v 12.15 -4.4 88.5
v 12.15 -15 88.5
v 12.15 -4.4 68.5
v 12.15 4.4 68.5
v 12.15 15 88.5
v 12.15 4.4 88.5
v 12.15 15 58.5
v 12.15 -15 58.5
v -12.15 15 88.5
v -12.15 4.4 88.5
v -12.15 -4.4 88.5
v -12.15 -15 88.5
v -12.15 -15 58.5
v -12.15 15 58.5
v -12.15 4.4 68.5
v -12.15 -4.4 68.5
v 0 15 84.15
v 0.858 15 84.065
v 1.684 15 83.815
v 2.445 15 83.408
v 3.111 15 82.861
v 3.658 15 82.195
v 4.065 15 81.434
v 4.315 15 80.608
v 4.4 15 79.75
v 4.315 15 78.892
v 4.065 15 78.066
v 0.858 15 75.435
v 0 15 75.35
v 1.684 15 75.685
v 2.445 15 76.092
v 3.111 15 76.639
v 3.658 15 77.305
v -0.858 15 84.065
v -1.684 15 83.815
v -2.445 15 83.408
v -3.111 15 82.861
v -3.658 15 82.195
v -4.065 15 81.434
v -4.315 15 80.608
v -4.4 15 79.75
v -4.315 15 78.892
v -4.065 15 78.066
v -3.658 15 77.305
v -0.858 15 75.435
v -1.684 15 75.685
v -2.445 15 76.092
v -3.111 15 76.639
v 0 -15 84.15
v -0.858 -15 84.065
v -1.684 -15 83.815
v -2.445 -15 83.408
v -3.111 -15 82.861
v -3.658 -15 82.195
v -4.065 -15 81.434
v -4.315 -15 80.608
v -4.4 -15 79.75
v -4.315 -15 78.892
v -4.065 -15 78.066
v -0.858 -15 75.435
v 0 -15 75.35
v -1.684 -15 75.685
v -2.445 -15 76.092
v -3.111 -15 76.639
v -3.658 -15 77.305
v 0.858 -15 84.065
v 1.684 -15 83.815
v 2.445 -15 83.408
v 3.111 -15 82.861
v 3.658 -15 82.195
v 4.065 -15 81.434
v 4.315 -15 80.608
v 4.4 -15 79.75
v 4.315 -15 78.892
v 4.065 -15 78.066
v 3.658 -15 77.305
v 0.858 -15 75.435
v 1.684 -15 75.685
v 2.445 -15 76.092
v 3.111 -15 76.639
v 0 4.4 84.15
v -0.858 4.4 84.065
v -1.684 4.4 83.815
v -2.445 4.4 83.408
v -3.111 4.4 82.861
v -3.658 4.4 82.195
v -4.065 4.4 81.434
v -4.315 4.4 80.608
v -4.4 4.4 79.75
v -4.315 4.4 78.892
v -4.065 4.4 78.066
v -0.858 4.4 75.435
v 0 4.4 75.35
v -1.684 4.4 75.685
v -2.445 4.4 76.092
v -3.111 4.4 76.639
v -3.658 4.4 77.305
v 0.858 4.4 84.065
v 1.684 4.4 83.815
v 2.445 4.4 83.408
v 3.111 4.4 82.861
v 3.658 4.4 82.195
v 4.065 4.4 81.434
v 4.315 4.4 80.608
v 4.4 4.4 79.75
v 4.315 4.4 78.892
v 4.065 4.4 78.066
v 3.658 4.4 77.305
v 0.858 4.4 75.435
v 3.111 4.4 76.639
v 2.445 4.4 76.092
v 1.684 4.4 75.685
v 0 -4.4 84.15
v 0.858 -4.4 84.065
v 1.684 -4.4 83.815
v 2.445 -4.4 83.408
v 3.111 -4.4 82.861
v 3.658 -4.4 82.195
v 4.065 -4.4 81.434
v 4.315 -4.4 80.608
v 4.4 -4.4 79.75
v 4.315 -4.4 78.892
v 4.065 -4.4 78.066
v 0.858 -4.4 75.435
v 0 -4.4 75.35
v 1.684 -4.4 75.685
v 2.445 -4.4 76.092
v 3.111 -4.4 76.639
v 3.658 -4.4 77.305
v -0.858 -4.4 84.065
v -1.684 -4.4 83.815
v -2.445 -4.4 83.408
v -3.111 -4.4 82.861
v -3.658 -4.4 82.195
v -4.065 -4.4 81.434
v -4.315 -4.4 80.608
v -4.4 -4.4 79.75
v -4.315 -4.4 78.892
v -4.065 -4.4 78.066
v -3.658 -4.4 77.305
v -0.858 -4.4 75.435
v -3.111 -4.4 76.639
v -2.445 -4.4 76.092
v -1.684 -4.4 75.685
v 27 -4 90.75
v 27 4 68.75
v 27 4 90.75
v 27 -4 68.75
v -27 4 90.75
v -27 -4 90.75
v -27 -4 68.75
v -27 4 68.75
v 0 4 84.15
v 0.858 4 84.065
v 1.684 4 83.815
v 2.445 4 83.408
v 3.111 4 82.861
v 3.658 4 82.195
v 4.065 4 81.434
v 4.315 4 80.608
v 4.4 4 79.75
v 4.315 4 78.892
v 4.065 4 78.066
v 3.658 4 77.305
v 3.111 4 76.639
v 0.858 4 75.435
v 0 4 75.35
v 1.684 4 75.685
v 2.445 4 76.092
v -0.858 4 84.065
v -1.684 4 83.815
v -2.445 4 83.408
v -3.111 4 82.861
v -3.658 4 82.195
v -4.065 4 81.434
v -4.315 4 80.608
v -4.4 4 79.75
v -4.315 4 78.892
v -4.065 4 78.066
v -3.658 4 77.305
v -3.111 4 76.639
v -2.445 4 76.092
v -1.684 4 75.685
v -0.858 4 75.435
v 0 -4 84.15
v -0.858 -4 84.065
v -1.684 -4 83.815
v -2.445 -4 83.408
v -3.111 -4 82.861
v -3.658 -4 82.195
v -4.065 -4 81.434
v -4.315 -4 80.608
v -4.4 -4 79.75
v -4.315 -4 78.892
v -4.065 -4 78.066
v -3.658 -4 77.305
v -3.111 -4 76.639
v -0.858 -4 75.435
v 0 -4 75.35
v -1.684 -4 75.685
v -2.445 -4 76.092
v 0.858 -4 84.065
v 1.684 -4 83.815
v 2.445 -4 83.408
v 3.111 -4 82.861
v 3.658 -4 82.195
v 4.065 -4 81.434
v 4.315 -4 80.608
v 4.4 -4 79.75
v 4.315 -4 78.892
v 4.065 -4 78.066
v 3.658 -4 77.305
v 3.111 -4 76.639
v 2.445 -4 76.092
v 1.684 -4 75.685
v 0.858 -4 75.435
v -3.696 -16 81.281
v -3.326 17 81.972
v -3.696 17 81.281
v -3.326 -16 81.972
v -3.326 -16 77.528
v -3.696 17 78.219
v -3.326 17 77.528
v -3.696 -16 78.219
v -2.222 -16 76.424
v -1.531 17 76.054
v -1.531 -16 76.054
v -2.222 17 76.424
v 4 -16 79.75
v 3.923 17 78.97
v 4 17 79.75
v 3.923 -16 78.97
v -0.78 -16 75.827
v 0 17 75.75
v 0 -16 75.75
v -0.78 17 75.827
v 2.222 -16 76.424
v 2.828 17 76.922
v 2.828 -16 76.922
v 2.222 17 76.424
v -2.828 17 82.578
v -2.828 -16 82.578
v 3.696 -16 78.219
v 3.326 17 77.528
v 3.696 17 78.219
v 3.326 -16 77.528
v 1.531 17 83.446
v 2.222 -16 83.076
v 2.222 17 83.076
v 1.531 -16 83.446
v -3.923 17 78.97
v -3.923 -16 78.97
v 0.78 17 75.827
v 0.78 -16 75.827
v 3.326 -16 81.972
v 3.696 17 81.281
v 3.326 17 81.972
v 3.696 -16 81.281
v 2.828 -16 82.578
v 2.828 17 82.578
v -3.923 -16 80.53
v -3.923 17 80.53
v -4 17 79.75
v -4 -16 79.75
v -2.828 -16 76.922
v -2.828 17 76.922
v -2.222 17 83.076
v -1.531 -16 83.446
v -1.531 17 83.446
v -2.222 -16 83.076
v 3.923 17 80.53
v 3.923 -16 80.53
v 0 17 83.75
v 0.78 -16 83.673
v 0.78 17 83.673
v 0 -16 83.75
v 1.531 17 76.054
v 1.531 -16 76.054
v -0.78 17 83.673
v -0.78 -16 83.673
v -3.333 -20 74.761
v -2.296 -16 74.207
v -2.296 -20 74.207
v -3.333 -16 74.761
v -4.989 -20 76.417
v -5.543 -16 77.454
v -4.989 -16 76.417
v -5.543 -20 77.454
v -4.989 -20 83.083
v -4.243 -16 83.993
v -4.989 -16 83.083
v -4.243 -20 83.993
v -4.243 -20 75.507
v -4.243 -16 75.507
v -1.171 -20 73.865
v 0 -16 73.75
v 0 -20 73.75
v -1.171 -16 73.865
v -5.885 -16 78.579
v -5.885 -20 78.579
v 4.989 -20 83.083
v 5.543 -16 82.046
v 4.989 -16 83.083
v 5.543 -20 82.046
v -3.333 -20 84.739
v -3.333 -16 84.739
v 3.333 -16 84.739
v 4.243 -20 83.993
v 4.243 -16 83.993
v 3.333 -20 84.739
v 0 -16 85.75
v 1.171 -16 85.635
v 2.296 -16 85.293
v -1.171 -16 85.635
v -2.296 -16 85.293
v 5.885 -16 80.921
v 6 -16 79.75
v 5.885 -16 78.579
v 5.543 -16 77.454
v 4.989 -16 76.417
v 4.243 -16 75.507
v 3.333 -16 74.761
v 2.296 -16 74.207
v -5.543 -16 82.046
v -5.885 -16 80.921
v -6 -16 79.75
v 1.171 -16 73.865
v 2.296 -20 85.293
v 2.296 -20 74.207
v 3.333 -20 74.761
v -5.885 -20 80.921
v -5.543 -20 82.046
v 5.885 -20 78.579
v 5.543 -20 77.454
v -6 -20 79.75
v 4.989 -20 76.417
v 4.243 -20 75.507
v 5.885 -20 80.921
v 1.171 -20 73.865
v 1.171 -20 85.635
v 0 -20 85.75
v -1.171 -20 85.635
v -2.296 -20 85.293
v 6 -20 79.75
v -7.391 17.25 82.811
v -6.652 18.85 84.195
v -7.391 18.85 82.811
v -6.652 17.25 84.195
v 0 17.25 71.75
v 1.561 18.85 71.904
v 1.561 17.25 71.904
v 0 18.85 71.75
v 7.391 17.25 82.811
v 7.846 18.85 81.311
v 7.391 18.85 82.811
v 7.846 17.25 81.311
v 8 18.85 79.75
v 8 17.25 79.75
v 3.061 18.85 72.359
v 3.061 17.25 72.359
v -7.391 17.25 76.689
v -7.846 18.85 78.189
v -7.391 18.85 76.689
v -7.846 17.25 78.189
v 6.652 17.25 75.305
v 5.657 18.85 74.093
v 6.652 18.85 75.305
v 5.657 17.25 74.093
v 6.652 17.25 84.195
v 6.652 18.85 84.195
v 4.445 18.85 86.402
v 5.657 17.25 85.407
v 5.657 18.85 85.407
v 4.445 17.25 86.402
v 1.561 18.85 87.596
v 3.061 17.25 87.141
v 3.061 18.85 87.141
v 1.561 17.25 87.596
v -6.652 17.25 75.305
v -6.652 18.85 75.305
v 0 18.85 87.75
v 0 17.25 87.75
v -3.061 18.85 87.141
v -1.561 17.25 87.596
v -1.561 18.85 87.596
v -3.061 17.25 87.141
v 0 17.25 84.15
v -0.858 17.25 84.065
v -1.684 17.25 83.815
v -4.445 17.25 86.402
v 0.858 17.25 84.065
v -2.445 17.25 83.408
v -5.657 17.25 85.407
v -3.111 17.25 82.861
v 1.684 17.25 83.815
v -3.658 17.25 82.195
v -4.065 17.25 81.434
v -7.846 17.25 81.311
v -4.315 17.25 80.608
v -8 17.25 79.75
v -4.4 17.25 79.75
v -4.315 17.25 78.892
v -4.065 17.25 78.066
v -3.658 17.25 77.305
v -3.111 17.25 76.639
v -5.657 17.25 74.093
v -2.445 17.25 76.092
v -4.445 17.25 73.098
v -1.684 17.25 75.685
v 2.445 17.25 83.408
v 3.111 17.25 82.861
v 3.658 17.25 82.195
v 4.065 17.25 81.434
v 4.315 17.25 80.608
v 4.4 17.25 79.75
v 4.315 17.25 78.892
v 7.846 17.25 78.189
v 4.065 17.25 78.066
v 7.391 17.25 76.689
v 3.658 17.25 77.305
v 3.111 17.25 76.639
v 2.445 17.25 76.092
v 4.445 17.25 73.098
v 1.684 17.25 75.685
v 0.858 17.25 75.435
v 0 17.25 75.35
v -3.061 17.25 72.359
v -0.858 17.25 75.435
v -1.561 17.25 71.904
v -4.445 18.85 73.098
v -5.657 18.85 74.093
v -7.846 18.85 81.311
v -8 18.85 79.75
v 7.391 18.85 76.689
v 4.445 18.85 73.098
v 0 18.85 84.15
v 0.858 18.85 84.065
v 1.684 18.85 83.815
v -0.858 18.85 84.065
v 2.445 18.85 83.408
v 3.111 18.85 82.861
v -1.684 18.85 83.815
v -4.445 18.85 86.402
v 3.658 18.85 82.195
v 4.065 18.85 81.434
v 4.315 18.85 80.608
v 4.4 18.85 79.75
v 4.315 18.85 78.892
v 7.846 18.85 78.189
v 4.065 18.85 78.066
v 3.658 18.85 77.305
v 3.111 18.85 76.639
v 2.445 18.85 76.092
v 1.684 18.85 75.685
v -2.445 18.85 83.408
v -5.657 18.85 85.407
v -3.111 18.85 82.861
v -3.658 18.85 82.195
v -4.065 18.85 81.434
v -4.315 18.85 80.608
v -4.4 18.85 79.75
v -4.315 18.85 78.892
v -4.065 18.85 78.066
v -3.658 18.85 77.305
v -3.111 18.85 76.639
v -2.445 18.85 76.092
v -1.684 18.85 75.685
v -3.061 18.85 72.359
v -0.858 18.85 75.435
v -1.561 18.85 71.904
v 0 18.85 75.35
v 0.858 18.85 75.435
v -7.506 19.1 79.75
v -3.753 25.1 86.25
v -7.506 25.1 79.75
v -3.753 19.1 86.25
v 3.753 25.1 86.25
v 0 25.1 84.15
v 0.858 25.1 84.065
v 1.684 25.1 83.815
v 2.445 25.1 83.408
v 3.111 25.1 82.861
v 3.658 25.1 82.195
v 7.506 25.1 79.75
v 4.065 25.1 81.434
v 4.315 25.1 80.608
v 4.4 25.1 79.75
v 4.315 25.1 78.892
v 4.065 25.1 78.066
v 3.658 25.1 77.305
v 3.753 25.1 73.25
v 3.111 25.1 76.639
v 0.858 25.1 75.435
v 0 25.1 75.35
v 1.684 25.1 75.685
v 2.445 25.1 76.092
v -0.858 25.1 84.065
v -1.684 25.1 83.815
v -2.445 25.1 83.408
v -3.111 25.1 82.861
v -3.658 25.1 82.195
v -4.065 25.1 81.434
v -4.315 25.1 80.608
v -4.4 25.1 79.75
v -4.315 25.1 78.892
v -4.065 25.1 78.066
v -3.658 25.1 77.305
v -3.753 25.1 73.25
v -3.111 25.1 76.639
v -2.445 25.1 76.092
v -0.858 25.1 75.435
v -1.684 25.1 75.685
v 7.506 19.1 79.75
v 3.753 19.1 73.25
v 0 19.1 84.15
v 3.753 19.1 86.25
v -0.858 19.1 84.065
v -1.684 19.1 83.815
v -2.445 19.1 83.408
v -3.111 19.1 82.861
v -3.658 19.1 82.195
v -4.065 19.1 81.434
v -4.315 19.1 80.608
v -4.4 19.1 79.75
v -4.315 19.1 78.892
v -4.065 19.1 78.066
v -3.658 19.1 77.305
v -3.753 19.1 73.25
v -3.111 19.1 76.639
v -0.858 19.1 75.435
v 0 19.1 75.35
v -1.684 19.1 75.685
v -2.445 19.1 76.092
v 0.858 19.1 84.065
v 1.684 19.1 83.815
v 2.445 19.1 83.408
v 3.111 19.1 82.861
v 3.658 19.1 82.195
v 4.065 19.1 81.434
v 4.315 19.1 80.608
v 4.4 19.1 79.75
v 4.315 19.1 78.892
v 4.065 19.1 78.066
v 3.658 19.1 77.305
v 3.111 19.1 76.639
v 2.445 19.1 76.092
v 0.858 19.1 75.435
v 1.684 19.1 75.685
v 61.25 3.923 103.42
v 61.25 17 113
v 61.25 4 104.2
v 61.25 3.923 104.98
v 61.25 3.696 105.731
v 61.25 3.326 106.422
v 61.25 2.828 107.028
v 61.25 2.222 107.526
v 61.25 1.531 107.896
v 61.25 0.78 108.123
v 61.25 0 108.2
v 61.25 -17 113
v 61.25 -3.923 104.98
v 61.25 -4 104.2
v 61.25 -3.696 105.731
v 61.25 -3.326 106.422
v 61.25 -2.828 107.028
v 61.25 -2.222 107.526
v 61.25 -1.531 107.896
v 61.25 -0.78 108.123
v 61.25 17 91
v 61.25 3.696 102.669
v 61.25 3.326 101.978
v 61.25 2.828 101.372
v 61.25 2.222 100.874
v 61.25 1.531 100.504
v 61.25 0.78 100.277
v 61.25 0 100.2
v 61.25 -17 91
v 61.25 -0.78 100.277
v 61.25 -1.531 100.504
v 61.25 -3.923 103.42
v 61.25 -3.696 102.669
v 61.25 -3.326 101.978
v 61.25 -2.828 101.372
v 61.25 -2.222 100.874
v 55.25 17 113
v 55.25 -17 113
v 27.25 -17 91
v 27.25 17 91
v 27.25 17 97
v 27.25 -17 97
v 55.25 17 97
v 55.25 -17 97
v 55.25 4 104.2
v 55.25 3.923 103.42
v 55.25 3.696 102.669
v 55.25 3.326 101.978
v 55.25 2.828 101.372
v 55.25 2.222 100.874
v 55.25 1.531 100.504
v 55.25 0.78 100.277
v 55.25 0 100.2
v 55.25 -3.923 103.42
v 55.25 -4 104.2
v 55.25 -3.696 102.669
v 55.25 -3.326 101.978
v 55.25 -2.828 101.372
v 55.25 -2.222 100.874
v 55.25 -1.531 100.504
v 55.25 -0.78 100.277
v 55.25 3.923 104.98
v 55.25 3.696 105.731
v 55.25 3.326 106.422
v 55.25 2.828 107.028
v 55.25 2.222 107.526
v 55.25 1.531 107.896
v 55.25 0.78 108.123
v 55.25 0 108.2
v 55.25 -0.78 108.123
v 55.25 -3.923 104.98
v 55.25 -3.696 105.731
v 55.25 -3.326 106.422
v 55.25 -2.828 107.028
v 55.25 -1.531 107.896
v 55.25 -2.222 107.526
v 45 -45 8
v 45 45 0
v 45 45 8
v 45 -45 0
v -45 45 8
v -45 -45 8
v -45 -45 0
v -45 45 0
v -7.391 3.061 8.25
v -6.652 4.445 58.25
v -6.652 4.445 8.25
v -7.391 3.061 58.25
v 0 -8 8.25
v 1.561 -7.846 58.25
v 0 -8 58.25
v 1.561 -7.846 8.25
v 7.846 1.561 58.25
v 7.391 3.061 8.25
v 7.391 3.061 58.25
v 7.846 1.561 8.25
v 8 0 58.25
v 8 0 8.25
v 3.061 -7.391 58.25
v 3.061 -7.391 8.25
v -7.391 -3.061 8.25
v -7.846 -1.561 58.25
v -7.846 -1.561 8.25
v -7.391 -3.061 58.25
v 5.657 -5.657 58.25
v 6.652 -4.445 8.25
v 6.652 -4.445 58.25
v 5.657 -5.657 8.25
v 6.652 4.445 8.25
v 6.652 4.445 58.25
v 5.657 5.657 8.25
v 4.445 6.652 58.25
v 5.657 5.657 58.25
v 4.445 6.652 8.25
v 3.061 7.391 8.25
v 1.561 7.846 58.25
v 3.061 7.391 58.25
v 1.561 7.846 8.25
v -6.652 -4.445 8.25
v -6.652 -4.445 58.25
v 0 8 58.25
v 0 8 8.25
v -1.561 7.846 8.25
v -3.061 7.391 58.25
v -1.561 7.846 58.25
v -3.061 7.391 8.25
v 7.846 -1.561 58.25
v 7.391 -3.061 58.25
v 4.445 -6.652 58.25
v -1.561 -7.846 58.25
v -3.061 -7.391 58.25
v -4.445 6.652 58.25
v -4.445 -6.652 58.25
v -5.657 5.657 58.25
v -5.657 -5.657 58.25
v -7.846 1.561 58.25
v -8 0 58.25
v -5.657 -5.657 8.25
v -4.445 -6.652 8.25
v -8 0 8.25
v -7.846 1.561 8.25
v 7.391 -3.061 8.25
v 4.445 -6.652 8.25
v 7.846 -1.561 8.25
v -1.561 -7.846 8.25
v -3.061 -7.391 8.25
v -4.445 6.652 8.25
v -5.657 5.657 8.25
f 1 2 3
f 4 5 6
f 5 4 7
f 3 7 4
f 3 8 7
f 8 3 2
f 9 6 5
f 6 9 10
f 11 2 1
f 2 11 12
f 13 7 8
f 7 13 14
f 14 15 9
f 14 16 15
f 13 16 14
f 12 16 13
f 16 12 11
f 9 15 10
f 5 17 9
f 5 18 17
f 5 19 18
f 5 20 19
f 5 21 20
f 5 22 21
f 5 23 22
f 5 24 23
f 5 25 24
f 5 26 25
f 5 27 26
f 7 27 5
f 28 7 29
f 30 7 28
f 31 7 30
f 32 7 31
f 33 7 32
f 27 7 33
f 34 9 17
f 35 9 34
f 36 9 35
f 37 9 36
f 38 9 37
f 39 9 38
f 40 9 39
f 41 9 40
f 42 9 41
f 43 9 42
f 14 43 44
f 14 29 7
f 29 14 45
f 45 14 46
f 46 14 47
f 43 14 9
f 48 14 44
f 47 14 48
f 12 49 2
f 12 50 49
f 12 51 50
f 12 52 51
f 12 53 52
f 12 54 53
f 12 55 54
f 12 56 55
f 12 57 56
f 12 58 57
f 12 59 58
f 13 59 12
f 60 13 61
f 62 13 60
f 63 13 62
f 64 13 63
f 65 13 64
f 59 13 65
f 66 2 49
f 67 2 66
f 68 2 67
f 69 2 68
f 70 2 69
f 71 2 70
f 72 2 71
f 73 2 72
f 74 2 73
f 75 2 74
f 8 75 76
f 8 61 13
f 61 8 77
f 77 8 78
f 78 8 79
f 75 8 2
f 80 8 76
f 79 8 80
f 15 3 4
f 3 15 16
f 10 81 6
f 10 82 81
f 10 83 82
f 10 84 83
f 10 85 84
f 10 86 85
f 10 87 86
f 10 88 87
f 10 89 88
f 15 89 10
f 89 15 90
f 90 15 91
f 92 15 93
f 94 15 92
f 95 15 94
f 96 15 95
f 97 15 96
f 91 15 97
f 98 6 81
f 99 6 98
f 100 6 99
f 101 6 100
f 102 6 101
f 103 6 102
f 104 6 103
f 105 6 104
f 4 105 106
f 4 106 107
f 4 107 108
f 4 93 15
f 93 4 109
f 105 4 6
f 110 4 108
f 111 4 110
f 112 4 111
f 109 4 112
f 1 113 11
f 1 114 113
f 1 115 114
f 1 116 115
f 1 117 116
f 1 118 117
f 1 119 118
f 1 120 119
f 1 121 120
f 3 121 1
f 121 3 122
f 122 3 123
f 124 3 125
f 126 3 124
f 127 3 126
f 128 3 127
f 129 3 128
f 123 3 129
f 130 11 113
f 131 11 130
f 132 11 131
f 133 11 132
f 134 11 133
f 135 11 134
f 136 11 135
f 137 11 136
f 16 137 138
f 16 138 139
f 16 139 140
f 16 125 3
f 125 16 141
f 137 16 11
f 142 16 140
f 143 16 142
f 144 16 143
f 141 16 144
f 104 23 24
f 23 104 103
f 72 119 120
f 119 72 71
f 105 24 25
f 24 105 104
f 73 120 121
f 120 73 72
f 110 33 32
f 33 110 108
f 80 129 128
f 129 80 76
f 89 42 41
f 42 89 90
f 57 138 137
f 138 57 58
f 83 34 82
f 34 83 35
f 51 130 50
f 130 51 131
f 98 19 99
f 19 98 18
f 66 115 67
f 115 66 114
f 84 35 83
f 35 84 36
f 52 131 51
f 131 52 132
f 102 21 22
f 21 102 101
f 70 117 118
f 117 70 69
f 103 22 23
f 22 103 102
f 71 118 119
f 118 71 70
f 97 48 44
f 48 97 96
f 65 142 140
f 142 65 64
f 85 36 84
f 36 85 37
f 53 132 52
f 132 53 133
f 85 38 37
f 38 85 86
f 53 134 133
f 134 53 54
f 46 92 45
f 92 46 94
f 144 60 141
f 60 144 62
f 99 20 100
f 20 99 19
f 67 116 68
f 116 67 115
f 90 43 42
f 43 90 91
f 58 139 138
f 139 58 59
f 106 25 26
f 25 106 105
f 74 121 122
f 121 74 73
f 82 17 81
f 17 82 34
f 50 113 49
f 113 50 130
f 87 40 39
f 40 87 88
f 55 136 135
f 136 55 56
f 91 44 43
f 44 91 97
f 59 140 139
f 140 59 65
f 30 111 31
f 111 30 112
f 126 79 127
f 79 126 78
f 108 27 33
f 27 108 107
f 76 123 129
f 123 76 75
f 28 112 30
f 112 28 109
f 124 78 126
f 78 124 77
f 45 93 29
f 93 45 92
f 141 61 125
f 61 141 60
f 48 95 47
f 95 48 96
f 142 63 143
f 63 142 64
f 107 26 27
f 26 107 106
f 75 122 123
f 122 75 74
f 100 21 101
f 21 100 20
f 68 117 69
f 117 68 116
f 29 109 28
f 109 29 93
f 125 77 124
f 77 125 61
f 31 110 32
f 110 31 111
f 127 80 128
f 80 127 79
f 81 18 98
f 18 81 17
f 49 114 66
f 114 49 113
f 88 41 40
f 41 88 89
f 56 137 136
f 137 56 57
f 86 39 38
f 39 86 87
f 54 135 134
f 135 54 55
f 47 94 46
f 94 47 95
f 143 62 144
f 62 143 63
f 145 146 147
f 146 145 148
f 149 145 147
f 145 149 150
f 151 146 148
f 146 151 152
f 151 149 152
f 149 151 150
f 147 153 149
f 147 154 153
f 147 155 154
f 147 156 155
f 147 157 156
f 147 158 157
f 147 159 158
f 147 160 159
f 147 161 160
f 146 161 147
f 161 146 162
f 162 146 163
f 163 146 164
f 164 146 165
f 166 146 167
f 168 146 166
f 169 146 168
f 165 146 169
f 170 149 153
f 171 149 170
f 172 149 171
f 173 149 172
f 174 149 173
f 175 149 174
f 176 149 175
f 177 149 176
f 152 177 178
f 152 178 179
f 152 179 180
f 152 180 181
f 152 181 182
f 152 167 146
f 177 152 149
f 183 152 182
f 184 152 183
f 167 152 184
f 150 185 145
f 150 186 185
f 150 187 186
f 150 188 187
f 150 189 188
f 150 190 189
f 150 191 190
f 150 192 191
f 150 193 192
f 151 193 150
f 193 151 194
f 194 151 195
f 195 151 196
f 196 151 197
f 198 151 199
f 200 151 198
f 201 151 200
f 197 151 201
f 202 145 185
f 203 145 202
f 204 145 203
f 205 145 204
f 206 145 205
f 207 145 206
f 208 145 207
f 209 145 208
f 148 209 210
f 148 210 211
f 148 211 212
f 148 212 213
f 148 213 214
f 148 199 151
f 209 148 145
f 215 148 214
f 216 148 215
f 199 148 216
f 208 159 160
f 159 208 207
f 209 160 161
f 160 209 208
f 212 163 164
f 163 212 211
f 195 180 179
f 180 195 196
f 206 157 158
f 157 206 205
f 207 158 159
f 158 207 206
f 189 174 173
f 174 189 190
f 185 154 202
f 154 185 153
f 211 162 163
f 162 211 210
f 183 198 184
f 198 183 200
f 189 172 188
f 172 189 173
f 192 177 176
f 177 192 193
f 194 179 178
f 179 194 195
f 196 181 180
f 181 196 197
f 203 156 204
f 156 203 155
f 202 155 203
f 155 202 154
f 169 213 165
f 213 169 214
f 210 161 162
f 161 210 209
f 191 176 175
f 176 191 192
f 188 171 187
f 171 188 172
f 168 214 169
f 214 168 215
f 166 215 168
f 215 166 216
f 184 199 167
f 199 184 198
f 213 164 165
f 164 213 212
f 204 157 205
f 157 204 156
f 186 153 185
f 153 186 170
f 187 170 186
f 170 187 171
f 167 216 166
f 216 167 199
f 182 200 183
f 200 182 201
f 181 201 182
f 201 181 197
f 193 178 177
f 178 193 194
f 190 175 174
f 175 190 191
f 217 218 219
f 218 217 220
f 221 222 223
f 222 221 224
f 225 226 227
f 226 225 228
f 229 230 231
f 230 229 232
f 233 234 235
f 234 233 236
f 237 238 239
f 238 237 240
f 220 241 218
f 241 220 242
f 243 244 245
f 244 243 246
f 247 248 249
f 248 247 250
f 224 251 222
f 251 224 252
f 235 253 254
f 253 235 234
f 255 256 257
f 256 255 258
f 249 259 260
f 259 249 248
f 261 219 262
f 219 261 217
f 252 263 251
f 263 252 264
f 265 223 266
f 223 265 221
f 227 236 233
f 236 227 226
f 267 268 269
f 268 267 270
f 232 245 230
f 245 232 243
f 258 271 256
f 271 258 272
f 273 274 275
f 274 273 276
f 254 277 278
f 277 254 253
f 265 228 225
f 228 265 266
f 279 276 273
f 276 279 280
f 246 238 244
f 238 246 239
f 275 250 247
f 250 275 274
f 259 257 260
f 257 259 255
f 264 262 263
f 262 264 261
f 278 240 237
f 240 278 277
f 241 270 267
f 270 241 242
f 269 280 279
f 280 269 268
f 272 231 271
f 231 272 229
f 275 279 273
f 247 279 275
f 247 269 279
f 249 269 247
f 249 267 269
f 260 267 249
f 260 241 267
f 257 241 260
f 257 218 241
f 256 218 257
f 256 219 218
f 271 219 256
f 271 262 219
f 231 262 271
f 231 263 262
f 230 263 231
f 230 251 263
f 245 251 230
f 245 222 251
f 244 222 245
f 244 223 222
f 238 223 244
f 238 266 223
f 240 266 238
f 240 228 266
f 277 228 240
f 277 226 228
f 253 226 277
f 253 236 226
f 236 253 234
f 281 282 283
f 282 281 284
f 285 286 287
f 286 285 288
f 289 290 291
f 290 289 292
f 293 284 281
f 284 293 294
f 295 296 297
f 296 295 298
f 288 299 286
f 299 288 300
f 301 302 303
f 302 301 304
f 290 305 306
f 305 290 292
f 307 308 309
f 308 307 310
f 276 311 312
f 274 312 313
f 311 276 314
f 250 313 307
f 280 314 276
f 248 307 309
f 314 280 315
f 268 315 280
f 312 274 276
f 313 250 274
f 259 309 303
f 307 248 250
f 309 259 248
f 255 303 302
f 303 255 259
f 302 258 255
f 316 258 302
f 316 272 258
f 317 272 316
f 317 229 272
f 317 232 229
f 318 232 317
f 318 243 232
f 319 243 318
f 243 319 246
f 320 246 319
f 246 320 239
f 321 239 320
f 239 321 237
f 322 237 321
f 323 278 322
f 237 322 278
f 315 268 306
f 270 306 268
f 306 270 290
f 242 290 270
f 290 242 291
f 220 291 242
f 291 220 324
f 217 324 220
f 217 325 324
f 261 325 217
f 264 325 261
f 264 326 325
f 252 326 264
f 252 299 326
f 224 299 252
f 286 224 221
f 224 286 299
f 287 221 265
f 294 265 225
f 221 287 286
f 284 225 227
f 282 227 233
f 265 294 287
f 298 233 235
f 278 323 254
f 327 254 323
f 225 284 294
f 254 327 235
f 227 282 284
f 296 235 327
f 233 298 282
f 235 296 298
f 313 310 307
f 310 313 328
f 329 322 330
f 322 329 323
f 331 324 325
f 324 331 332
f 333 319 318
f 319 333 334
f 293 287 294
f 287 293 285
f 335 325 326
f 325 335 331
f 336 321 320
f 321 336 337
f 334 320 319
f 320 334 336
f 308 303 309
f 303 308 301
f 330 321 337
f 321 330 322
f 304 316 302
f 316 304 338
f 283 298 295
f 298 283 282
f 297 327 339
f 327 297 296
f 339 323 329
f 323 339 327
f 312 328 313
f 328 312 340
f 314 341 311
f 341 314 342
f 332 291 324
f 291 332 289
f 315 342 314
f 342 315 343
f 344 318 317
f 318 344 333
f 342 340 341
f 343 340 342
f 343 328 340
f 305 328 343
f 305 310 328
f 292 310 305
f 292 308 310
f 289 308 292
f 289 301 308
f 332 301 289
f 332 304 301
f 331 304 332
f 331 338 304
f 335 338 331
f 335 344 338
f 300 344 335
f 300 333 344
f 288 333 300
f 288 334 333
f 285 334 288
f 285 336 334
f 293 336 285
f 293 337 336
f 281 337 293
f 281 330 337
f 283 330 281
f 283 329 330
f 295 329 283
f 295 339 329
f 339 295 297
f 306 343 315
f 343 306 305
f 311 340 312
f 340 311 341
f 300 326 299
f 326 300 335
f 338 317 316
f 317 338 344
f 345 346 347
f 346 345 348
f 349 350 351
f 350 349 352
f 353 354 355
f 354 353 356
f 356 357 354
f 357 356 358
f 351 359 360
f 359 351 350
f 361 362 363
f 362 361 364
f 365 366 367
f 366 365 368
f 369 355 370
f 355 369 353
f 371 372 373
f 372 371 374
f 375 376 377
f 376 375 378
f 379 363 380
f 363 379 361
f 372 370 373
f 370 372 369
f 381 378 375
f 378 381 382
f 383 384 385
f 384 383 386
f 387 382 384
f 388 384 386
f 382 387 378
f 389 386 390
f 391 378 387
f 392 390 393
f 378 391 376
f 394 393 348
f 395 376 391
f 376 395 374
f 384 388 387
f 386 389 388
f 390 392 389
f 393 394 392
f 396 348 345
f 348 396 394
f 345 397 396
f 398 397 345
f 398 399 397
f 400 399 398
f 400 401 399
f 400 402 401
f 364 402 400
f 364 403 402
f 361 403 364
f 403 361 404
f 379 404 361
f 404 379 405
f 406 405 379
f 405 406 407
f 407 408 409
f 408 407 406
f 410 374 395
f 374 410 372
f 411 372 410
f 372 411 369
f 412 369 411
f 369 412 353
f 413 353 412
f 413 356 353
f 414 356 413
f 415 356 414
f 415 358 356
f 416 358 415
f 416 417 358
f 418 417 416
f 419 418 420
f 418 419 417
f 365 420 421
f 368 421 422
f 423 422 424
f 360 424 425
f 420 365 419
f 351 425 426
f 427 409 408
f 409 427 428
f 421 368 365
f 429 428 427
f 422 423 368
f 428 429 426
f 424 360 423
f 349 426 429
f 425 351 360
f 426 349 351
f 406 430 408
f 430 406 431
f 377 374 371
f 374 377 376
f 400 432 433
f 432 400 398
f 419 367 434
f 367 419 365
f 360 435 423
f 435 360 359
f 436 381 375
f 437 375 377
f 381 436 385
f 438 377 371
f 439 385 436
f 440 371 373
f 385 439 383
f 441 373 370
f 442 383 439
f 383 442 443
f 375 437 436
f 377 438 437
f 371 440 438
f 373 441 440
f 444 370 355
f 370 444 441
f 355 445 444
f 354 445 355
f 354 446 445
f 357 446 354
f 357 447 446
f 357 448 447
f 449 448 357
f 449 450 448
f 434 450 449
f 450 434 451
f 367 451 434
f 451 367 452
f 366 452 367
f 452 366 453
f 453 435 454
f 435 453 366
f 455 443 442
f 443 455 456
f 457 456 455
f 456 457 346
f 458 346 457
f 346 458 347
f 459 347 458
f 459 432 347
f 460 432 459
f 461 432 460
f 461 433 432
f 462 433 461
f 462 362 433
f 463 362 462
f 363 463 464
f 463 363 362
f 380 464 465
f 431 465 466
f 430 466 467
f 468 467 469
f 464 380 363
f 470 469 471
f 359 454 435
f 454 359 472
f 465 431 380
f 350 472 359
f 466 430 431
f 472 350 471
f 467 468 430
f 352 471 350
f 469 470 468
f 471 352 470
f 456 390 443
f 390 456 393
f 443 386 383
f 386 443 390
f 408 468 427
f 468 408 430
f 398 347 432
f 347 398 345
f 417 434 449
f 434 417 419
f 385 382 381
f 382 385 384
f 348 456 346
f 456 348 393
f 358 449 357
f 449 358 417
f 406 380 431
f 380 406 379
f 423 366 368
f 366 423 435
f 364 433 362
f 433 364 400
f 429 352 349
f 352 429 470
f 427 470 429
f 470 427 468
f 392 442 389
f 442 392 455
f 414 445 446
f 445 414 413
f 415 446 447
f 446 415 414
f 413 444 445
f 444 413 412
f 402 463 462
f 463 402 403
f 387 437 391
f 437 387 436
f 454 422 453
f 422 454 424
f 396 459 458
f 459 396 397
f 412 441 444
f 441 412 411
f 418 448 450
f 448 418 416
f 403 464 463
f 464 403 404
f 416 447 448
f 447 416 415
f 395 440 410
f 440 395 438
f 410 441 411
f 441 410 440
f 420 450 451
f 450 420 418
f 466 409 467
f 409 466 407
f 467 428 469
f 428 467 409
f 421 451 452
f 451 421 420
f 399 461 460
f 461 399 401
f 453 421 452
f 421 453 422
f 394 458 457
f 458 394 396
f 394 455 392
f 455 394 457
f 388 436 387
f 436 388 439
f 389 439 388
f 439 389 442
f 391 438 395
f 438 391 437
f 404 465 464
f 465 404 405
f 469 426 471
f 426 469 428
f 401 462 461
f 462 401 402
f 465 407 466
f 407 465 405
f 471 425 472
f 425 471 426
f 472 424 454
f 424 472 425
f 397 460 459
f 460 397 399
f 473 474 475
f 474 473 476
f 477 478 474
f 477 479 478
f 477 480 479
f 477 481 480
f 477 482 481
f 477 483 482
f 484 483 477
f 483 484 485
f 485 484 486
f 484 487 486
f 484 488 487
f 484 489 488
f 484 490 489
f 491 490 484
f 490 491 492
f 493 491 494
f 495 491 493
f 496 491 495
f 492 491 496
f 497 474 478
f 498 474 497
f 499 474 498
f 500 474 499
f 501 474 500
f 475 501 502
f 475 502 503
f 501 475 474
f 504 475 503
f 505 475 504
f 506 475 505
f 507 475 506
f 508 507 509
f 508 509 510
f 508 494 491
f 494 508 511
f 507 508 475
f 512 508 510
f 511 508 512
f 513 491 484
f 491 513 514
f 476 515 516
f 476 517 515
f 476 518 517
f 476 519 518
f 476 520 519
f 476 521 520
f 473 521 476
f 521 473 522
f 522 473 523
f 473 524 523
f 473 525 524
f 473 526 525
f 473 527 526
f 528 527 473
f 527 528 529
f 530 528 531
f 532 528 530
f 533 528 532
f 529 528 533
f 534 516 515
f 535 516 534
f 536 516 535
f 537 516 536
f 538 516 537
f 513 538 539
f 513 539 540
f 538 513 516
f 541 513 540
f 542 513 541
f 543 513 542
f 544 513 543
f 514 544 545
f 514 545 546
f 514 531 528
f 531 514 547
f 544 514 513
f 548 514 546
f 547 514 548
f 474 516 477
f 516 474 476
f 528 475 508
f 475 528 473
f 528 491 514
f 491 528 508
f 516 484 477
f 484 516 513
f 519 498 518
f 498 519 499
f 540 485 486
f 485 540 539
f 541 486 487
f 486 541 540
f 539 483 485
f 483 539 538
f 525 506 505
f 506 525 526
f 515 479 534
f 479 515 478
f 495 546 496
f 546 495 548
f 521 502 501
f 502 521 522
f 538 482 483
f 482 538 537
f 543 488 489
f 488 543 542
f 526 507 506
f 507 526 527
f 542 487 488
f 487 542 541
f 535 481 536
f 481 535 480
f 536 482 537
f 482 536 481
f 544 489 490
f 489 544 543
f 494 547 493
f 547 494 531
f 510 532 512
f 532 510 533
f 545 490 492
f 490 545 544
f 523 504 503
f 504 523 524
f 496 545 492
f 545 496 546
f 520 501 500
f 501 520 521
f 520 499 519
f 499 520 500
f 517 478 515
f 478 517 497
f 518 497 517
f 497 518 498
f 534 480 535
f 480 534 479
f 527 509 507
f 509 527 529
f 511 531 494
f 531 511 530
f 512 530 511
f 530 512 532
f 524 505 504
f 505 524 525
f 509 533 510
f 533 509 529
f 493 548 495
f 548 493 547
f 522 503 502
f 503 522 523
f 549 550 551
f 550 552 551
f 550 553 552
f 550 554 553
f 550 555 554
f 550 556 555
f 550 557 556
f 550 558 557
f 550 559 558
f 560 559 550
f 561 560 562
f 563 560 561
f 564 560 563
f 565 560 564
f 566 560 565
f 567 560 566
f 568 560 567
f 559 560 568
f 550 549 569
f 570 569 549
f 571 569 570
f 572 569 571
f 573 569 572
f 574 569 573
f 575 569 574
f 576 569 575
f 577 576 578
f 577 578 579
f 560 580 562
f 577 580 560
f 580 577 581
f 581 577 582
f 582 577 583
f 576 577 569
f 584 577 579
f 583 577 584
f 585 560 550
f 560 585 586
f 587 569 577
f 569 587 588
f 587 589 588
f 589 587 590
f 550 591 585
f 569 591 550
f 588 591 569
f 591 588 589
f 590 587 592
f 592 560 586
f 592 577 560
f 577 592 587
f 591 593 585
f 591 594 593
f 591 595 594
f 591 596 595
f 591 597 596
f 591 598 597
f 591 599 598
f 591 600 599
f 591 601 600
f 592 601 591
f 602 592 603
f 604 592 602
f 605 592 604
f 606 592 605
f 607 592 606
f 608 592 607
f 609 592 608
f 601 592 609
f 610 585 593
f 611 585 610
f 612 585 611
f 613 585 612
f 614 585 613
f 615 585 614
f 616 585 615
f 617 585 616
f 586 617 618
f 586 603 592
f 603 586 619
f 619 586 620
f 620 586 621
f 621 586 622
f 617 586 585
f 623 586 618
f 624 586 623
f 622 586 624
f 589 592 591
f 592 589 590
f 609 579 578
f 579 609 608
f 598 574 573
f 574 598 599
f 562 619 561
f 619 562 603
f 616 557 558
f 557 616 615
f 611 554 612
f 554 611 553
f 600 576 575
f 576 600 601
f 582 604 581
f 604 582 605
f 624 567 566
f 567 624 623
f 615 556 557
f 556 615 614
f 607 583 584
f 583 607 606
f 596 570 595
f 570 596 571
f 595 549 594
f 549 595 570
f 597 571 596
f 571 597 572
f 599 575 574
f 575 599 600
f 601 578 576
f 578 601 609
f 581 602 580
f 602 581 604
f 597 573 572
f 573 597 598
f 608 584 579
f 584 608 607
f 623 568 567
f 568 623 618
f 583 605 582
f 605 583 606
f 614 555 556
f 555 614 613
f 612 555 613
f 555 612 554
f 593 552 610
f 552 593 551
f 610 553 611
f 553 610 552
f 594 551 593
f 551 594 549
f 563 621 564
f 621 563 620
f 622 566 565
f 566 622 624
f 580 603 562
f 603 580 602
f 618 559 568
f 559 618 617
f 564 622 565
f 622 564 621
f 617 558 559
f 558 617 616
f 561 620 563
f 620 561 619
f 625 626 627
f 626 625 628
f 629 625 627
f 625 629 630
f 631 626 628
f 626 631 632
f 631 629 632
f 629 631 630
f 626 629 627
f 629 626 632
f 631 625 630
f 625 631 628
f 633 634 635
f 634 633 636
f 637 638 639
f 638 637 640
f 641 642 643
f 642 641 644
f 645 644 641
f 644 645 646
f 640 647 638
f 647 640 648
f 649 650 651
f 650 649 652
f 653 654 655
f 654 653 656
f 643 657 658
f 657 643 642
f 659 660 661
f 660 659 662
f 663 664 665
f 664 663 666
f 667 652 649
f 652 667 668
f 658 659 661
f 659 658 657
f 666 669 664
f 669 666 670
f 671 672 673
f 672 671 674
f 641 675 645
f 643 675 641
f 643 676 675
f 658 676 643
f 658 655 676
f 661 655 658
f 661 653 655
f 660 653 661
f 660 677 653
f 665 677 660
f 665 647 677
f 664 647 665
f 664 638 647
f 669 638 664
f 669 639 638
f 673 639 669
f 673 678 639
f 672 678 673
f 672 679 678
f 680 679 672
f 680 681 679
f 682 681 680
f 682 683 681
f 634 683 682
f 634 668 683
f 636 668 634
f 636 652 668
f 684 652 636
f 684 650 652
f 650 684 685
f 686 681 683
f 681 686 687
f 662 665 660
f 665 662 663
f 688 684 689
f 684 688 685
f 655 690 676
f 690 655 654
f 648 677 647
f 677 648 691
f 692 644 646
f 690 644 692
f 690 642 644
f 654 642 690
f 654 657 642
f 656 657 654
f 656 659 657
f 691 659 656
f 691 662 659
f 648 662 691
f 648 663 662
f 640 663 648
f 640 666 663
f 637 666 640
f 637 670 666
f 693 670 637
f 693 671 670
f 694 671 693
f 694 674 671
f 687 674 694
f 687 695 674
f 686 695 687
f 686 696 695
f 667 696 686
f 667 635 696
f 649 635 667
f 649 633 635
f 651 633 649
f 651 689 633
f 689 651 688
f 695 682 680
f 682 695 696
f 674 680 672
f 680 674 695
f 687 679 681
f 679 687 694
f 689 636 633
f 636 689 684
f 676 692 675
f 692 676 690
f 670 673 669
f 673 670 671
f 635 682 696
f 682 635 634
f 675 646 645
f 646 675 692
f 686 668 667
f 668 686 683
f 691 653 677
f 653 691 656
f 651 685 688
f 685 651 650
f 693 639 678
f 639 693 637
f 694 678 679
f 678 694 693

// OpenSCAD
$fn = 32;

// ------------------------------------------------------------------------
// Lamp arm: column d16 x 50 mm, arm 54 mm
// Every part is its own module, assembly() places every instance.
// ------------------------------------------------------------------------

// --- part 1 ---
module lamp_base() {
  difference() {
    translate([-45, -45, 0]) cube([90, 90, 8]);
  }
}

// --- part 2 ---
module lamp_column() {
  cylinder(h = 50, d = 16);
}

// --- part 3 ---
module head_fork() {
  difference() {
    translate([-12.15, -15, 0]) cube([24.3, 30, 30]);
    translate([-13.15, -4.4, 10]) cube([26.3, 8.8, 21]);
    translate([0, 0, 21.25]) rotate([90, 0, 0]) cylinder(h = 32, d = 8.8, center = true);
  }
}

// --- part 4 ---
module lamp_arm() {
  difference() {
    translate([-27, -4, 0]) cube([54, 8, 22]);
    translate([0, 0, 11]) rotate([90, 0, 0]) cylinder(h = 10, d = 8.8, center = true);
  }
}

// --- part 5 ---
module arm_pin() {
  rotate([0, 90, 0]) cylinder(h = 34, d = 8, center = true);
  translate([-20, 0, 0]) rotate([0, 90, 0]) cylinder(h = 4, d = 12);
}

// --- part 6 ---
module arm_washer() {
  difference() {
      translate([0, 0, 0]) cylinder(h = 1.6, d = 16);
      translate([0, 0, -1]) cylinder(h = 3.6, d = 8.8);
    }
}

// --- part 7 ---
module arm_nut() {
  difference() {
    linear_extrude(height = 6) polygon(points = [[7.506, 0], [3.753, 6.5], [-3.753, 6.5], [-7.506, 0], [-3.753, -6.5], [3.753, -6.5]]);
    translate([0, 0, -1]) cylinder(h = 8, d = 8.8);
  }
}

// --- part 8 ---
module shade_bracket() {
  difference() {
    translate([-17, -17, 0]) cube([34, 34, 22]);
    translate([-18, -18, 6]) cube([29, 36, 17]);
    translate([14, 0, 13.2]) rotate([0, 90, 0]) cylinder(h = 8, d = 8, center = true);
  }
}

// --- assembly ---
module assembly() {
  color([0.80, 0.24, 0.20]) translate([0, 0, 0]) rotate([0, 0, 0]) lamp_base();
  color([0.20, 0.45, 0.75]) translate([0, 0, 8.25]) rotate([0, 0, 0]) lamp_column();
  color([0.25, 0.62, 0.32]) translate([0, 0, 58.5]) rotate([0, 0, 0]) head_fork();
  color([0.92, 0.70, 0.18]) translate([0, 0, 68.75]) rotate([0, 0, 0]) lamp_arm();
  color([0.58, 0.35, 0.70]) translate([0, 0, 79.75]) rotate([0, 0, 90]) arm_pin();
  color([0.16, 0.66, 0.66]) translate([0, 18.85, 79.75]) rotate([90, 0, 0]) arm_washer();
  color([0.85, 0.48, 0.18]) translate([0, 25.1, 79.75]) rotate([90, 0, 0]) arm_nut();
  color([0.55, 0.60, 0.65]) translate([44.25, 0, 91]) rotate([0, 0, 0]) shade_bracket();
}

assembly();
